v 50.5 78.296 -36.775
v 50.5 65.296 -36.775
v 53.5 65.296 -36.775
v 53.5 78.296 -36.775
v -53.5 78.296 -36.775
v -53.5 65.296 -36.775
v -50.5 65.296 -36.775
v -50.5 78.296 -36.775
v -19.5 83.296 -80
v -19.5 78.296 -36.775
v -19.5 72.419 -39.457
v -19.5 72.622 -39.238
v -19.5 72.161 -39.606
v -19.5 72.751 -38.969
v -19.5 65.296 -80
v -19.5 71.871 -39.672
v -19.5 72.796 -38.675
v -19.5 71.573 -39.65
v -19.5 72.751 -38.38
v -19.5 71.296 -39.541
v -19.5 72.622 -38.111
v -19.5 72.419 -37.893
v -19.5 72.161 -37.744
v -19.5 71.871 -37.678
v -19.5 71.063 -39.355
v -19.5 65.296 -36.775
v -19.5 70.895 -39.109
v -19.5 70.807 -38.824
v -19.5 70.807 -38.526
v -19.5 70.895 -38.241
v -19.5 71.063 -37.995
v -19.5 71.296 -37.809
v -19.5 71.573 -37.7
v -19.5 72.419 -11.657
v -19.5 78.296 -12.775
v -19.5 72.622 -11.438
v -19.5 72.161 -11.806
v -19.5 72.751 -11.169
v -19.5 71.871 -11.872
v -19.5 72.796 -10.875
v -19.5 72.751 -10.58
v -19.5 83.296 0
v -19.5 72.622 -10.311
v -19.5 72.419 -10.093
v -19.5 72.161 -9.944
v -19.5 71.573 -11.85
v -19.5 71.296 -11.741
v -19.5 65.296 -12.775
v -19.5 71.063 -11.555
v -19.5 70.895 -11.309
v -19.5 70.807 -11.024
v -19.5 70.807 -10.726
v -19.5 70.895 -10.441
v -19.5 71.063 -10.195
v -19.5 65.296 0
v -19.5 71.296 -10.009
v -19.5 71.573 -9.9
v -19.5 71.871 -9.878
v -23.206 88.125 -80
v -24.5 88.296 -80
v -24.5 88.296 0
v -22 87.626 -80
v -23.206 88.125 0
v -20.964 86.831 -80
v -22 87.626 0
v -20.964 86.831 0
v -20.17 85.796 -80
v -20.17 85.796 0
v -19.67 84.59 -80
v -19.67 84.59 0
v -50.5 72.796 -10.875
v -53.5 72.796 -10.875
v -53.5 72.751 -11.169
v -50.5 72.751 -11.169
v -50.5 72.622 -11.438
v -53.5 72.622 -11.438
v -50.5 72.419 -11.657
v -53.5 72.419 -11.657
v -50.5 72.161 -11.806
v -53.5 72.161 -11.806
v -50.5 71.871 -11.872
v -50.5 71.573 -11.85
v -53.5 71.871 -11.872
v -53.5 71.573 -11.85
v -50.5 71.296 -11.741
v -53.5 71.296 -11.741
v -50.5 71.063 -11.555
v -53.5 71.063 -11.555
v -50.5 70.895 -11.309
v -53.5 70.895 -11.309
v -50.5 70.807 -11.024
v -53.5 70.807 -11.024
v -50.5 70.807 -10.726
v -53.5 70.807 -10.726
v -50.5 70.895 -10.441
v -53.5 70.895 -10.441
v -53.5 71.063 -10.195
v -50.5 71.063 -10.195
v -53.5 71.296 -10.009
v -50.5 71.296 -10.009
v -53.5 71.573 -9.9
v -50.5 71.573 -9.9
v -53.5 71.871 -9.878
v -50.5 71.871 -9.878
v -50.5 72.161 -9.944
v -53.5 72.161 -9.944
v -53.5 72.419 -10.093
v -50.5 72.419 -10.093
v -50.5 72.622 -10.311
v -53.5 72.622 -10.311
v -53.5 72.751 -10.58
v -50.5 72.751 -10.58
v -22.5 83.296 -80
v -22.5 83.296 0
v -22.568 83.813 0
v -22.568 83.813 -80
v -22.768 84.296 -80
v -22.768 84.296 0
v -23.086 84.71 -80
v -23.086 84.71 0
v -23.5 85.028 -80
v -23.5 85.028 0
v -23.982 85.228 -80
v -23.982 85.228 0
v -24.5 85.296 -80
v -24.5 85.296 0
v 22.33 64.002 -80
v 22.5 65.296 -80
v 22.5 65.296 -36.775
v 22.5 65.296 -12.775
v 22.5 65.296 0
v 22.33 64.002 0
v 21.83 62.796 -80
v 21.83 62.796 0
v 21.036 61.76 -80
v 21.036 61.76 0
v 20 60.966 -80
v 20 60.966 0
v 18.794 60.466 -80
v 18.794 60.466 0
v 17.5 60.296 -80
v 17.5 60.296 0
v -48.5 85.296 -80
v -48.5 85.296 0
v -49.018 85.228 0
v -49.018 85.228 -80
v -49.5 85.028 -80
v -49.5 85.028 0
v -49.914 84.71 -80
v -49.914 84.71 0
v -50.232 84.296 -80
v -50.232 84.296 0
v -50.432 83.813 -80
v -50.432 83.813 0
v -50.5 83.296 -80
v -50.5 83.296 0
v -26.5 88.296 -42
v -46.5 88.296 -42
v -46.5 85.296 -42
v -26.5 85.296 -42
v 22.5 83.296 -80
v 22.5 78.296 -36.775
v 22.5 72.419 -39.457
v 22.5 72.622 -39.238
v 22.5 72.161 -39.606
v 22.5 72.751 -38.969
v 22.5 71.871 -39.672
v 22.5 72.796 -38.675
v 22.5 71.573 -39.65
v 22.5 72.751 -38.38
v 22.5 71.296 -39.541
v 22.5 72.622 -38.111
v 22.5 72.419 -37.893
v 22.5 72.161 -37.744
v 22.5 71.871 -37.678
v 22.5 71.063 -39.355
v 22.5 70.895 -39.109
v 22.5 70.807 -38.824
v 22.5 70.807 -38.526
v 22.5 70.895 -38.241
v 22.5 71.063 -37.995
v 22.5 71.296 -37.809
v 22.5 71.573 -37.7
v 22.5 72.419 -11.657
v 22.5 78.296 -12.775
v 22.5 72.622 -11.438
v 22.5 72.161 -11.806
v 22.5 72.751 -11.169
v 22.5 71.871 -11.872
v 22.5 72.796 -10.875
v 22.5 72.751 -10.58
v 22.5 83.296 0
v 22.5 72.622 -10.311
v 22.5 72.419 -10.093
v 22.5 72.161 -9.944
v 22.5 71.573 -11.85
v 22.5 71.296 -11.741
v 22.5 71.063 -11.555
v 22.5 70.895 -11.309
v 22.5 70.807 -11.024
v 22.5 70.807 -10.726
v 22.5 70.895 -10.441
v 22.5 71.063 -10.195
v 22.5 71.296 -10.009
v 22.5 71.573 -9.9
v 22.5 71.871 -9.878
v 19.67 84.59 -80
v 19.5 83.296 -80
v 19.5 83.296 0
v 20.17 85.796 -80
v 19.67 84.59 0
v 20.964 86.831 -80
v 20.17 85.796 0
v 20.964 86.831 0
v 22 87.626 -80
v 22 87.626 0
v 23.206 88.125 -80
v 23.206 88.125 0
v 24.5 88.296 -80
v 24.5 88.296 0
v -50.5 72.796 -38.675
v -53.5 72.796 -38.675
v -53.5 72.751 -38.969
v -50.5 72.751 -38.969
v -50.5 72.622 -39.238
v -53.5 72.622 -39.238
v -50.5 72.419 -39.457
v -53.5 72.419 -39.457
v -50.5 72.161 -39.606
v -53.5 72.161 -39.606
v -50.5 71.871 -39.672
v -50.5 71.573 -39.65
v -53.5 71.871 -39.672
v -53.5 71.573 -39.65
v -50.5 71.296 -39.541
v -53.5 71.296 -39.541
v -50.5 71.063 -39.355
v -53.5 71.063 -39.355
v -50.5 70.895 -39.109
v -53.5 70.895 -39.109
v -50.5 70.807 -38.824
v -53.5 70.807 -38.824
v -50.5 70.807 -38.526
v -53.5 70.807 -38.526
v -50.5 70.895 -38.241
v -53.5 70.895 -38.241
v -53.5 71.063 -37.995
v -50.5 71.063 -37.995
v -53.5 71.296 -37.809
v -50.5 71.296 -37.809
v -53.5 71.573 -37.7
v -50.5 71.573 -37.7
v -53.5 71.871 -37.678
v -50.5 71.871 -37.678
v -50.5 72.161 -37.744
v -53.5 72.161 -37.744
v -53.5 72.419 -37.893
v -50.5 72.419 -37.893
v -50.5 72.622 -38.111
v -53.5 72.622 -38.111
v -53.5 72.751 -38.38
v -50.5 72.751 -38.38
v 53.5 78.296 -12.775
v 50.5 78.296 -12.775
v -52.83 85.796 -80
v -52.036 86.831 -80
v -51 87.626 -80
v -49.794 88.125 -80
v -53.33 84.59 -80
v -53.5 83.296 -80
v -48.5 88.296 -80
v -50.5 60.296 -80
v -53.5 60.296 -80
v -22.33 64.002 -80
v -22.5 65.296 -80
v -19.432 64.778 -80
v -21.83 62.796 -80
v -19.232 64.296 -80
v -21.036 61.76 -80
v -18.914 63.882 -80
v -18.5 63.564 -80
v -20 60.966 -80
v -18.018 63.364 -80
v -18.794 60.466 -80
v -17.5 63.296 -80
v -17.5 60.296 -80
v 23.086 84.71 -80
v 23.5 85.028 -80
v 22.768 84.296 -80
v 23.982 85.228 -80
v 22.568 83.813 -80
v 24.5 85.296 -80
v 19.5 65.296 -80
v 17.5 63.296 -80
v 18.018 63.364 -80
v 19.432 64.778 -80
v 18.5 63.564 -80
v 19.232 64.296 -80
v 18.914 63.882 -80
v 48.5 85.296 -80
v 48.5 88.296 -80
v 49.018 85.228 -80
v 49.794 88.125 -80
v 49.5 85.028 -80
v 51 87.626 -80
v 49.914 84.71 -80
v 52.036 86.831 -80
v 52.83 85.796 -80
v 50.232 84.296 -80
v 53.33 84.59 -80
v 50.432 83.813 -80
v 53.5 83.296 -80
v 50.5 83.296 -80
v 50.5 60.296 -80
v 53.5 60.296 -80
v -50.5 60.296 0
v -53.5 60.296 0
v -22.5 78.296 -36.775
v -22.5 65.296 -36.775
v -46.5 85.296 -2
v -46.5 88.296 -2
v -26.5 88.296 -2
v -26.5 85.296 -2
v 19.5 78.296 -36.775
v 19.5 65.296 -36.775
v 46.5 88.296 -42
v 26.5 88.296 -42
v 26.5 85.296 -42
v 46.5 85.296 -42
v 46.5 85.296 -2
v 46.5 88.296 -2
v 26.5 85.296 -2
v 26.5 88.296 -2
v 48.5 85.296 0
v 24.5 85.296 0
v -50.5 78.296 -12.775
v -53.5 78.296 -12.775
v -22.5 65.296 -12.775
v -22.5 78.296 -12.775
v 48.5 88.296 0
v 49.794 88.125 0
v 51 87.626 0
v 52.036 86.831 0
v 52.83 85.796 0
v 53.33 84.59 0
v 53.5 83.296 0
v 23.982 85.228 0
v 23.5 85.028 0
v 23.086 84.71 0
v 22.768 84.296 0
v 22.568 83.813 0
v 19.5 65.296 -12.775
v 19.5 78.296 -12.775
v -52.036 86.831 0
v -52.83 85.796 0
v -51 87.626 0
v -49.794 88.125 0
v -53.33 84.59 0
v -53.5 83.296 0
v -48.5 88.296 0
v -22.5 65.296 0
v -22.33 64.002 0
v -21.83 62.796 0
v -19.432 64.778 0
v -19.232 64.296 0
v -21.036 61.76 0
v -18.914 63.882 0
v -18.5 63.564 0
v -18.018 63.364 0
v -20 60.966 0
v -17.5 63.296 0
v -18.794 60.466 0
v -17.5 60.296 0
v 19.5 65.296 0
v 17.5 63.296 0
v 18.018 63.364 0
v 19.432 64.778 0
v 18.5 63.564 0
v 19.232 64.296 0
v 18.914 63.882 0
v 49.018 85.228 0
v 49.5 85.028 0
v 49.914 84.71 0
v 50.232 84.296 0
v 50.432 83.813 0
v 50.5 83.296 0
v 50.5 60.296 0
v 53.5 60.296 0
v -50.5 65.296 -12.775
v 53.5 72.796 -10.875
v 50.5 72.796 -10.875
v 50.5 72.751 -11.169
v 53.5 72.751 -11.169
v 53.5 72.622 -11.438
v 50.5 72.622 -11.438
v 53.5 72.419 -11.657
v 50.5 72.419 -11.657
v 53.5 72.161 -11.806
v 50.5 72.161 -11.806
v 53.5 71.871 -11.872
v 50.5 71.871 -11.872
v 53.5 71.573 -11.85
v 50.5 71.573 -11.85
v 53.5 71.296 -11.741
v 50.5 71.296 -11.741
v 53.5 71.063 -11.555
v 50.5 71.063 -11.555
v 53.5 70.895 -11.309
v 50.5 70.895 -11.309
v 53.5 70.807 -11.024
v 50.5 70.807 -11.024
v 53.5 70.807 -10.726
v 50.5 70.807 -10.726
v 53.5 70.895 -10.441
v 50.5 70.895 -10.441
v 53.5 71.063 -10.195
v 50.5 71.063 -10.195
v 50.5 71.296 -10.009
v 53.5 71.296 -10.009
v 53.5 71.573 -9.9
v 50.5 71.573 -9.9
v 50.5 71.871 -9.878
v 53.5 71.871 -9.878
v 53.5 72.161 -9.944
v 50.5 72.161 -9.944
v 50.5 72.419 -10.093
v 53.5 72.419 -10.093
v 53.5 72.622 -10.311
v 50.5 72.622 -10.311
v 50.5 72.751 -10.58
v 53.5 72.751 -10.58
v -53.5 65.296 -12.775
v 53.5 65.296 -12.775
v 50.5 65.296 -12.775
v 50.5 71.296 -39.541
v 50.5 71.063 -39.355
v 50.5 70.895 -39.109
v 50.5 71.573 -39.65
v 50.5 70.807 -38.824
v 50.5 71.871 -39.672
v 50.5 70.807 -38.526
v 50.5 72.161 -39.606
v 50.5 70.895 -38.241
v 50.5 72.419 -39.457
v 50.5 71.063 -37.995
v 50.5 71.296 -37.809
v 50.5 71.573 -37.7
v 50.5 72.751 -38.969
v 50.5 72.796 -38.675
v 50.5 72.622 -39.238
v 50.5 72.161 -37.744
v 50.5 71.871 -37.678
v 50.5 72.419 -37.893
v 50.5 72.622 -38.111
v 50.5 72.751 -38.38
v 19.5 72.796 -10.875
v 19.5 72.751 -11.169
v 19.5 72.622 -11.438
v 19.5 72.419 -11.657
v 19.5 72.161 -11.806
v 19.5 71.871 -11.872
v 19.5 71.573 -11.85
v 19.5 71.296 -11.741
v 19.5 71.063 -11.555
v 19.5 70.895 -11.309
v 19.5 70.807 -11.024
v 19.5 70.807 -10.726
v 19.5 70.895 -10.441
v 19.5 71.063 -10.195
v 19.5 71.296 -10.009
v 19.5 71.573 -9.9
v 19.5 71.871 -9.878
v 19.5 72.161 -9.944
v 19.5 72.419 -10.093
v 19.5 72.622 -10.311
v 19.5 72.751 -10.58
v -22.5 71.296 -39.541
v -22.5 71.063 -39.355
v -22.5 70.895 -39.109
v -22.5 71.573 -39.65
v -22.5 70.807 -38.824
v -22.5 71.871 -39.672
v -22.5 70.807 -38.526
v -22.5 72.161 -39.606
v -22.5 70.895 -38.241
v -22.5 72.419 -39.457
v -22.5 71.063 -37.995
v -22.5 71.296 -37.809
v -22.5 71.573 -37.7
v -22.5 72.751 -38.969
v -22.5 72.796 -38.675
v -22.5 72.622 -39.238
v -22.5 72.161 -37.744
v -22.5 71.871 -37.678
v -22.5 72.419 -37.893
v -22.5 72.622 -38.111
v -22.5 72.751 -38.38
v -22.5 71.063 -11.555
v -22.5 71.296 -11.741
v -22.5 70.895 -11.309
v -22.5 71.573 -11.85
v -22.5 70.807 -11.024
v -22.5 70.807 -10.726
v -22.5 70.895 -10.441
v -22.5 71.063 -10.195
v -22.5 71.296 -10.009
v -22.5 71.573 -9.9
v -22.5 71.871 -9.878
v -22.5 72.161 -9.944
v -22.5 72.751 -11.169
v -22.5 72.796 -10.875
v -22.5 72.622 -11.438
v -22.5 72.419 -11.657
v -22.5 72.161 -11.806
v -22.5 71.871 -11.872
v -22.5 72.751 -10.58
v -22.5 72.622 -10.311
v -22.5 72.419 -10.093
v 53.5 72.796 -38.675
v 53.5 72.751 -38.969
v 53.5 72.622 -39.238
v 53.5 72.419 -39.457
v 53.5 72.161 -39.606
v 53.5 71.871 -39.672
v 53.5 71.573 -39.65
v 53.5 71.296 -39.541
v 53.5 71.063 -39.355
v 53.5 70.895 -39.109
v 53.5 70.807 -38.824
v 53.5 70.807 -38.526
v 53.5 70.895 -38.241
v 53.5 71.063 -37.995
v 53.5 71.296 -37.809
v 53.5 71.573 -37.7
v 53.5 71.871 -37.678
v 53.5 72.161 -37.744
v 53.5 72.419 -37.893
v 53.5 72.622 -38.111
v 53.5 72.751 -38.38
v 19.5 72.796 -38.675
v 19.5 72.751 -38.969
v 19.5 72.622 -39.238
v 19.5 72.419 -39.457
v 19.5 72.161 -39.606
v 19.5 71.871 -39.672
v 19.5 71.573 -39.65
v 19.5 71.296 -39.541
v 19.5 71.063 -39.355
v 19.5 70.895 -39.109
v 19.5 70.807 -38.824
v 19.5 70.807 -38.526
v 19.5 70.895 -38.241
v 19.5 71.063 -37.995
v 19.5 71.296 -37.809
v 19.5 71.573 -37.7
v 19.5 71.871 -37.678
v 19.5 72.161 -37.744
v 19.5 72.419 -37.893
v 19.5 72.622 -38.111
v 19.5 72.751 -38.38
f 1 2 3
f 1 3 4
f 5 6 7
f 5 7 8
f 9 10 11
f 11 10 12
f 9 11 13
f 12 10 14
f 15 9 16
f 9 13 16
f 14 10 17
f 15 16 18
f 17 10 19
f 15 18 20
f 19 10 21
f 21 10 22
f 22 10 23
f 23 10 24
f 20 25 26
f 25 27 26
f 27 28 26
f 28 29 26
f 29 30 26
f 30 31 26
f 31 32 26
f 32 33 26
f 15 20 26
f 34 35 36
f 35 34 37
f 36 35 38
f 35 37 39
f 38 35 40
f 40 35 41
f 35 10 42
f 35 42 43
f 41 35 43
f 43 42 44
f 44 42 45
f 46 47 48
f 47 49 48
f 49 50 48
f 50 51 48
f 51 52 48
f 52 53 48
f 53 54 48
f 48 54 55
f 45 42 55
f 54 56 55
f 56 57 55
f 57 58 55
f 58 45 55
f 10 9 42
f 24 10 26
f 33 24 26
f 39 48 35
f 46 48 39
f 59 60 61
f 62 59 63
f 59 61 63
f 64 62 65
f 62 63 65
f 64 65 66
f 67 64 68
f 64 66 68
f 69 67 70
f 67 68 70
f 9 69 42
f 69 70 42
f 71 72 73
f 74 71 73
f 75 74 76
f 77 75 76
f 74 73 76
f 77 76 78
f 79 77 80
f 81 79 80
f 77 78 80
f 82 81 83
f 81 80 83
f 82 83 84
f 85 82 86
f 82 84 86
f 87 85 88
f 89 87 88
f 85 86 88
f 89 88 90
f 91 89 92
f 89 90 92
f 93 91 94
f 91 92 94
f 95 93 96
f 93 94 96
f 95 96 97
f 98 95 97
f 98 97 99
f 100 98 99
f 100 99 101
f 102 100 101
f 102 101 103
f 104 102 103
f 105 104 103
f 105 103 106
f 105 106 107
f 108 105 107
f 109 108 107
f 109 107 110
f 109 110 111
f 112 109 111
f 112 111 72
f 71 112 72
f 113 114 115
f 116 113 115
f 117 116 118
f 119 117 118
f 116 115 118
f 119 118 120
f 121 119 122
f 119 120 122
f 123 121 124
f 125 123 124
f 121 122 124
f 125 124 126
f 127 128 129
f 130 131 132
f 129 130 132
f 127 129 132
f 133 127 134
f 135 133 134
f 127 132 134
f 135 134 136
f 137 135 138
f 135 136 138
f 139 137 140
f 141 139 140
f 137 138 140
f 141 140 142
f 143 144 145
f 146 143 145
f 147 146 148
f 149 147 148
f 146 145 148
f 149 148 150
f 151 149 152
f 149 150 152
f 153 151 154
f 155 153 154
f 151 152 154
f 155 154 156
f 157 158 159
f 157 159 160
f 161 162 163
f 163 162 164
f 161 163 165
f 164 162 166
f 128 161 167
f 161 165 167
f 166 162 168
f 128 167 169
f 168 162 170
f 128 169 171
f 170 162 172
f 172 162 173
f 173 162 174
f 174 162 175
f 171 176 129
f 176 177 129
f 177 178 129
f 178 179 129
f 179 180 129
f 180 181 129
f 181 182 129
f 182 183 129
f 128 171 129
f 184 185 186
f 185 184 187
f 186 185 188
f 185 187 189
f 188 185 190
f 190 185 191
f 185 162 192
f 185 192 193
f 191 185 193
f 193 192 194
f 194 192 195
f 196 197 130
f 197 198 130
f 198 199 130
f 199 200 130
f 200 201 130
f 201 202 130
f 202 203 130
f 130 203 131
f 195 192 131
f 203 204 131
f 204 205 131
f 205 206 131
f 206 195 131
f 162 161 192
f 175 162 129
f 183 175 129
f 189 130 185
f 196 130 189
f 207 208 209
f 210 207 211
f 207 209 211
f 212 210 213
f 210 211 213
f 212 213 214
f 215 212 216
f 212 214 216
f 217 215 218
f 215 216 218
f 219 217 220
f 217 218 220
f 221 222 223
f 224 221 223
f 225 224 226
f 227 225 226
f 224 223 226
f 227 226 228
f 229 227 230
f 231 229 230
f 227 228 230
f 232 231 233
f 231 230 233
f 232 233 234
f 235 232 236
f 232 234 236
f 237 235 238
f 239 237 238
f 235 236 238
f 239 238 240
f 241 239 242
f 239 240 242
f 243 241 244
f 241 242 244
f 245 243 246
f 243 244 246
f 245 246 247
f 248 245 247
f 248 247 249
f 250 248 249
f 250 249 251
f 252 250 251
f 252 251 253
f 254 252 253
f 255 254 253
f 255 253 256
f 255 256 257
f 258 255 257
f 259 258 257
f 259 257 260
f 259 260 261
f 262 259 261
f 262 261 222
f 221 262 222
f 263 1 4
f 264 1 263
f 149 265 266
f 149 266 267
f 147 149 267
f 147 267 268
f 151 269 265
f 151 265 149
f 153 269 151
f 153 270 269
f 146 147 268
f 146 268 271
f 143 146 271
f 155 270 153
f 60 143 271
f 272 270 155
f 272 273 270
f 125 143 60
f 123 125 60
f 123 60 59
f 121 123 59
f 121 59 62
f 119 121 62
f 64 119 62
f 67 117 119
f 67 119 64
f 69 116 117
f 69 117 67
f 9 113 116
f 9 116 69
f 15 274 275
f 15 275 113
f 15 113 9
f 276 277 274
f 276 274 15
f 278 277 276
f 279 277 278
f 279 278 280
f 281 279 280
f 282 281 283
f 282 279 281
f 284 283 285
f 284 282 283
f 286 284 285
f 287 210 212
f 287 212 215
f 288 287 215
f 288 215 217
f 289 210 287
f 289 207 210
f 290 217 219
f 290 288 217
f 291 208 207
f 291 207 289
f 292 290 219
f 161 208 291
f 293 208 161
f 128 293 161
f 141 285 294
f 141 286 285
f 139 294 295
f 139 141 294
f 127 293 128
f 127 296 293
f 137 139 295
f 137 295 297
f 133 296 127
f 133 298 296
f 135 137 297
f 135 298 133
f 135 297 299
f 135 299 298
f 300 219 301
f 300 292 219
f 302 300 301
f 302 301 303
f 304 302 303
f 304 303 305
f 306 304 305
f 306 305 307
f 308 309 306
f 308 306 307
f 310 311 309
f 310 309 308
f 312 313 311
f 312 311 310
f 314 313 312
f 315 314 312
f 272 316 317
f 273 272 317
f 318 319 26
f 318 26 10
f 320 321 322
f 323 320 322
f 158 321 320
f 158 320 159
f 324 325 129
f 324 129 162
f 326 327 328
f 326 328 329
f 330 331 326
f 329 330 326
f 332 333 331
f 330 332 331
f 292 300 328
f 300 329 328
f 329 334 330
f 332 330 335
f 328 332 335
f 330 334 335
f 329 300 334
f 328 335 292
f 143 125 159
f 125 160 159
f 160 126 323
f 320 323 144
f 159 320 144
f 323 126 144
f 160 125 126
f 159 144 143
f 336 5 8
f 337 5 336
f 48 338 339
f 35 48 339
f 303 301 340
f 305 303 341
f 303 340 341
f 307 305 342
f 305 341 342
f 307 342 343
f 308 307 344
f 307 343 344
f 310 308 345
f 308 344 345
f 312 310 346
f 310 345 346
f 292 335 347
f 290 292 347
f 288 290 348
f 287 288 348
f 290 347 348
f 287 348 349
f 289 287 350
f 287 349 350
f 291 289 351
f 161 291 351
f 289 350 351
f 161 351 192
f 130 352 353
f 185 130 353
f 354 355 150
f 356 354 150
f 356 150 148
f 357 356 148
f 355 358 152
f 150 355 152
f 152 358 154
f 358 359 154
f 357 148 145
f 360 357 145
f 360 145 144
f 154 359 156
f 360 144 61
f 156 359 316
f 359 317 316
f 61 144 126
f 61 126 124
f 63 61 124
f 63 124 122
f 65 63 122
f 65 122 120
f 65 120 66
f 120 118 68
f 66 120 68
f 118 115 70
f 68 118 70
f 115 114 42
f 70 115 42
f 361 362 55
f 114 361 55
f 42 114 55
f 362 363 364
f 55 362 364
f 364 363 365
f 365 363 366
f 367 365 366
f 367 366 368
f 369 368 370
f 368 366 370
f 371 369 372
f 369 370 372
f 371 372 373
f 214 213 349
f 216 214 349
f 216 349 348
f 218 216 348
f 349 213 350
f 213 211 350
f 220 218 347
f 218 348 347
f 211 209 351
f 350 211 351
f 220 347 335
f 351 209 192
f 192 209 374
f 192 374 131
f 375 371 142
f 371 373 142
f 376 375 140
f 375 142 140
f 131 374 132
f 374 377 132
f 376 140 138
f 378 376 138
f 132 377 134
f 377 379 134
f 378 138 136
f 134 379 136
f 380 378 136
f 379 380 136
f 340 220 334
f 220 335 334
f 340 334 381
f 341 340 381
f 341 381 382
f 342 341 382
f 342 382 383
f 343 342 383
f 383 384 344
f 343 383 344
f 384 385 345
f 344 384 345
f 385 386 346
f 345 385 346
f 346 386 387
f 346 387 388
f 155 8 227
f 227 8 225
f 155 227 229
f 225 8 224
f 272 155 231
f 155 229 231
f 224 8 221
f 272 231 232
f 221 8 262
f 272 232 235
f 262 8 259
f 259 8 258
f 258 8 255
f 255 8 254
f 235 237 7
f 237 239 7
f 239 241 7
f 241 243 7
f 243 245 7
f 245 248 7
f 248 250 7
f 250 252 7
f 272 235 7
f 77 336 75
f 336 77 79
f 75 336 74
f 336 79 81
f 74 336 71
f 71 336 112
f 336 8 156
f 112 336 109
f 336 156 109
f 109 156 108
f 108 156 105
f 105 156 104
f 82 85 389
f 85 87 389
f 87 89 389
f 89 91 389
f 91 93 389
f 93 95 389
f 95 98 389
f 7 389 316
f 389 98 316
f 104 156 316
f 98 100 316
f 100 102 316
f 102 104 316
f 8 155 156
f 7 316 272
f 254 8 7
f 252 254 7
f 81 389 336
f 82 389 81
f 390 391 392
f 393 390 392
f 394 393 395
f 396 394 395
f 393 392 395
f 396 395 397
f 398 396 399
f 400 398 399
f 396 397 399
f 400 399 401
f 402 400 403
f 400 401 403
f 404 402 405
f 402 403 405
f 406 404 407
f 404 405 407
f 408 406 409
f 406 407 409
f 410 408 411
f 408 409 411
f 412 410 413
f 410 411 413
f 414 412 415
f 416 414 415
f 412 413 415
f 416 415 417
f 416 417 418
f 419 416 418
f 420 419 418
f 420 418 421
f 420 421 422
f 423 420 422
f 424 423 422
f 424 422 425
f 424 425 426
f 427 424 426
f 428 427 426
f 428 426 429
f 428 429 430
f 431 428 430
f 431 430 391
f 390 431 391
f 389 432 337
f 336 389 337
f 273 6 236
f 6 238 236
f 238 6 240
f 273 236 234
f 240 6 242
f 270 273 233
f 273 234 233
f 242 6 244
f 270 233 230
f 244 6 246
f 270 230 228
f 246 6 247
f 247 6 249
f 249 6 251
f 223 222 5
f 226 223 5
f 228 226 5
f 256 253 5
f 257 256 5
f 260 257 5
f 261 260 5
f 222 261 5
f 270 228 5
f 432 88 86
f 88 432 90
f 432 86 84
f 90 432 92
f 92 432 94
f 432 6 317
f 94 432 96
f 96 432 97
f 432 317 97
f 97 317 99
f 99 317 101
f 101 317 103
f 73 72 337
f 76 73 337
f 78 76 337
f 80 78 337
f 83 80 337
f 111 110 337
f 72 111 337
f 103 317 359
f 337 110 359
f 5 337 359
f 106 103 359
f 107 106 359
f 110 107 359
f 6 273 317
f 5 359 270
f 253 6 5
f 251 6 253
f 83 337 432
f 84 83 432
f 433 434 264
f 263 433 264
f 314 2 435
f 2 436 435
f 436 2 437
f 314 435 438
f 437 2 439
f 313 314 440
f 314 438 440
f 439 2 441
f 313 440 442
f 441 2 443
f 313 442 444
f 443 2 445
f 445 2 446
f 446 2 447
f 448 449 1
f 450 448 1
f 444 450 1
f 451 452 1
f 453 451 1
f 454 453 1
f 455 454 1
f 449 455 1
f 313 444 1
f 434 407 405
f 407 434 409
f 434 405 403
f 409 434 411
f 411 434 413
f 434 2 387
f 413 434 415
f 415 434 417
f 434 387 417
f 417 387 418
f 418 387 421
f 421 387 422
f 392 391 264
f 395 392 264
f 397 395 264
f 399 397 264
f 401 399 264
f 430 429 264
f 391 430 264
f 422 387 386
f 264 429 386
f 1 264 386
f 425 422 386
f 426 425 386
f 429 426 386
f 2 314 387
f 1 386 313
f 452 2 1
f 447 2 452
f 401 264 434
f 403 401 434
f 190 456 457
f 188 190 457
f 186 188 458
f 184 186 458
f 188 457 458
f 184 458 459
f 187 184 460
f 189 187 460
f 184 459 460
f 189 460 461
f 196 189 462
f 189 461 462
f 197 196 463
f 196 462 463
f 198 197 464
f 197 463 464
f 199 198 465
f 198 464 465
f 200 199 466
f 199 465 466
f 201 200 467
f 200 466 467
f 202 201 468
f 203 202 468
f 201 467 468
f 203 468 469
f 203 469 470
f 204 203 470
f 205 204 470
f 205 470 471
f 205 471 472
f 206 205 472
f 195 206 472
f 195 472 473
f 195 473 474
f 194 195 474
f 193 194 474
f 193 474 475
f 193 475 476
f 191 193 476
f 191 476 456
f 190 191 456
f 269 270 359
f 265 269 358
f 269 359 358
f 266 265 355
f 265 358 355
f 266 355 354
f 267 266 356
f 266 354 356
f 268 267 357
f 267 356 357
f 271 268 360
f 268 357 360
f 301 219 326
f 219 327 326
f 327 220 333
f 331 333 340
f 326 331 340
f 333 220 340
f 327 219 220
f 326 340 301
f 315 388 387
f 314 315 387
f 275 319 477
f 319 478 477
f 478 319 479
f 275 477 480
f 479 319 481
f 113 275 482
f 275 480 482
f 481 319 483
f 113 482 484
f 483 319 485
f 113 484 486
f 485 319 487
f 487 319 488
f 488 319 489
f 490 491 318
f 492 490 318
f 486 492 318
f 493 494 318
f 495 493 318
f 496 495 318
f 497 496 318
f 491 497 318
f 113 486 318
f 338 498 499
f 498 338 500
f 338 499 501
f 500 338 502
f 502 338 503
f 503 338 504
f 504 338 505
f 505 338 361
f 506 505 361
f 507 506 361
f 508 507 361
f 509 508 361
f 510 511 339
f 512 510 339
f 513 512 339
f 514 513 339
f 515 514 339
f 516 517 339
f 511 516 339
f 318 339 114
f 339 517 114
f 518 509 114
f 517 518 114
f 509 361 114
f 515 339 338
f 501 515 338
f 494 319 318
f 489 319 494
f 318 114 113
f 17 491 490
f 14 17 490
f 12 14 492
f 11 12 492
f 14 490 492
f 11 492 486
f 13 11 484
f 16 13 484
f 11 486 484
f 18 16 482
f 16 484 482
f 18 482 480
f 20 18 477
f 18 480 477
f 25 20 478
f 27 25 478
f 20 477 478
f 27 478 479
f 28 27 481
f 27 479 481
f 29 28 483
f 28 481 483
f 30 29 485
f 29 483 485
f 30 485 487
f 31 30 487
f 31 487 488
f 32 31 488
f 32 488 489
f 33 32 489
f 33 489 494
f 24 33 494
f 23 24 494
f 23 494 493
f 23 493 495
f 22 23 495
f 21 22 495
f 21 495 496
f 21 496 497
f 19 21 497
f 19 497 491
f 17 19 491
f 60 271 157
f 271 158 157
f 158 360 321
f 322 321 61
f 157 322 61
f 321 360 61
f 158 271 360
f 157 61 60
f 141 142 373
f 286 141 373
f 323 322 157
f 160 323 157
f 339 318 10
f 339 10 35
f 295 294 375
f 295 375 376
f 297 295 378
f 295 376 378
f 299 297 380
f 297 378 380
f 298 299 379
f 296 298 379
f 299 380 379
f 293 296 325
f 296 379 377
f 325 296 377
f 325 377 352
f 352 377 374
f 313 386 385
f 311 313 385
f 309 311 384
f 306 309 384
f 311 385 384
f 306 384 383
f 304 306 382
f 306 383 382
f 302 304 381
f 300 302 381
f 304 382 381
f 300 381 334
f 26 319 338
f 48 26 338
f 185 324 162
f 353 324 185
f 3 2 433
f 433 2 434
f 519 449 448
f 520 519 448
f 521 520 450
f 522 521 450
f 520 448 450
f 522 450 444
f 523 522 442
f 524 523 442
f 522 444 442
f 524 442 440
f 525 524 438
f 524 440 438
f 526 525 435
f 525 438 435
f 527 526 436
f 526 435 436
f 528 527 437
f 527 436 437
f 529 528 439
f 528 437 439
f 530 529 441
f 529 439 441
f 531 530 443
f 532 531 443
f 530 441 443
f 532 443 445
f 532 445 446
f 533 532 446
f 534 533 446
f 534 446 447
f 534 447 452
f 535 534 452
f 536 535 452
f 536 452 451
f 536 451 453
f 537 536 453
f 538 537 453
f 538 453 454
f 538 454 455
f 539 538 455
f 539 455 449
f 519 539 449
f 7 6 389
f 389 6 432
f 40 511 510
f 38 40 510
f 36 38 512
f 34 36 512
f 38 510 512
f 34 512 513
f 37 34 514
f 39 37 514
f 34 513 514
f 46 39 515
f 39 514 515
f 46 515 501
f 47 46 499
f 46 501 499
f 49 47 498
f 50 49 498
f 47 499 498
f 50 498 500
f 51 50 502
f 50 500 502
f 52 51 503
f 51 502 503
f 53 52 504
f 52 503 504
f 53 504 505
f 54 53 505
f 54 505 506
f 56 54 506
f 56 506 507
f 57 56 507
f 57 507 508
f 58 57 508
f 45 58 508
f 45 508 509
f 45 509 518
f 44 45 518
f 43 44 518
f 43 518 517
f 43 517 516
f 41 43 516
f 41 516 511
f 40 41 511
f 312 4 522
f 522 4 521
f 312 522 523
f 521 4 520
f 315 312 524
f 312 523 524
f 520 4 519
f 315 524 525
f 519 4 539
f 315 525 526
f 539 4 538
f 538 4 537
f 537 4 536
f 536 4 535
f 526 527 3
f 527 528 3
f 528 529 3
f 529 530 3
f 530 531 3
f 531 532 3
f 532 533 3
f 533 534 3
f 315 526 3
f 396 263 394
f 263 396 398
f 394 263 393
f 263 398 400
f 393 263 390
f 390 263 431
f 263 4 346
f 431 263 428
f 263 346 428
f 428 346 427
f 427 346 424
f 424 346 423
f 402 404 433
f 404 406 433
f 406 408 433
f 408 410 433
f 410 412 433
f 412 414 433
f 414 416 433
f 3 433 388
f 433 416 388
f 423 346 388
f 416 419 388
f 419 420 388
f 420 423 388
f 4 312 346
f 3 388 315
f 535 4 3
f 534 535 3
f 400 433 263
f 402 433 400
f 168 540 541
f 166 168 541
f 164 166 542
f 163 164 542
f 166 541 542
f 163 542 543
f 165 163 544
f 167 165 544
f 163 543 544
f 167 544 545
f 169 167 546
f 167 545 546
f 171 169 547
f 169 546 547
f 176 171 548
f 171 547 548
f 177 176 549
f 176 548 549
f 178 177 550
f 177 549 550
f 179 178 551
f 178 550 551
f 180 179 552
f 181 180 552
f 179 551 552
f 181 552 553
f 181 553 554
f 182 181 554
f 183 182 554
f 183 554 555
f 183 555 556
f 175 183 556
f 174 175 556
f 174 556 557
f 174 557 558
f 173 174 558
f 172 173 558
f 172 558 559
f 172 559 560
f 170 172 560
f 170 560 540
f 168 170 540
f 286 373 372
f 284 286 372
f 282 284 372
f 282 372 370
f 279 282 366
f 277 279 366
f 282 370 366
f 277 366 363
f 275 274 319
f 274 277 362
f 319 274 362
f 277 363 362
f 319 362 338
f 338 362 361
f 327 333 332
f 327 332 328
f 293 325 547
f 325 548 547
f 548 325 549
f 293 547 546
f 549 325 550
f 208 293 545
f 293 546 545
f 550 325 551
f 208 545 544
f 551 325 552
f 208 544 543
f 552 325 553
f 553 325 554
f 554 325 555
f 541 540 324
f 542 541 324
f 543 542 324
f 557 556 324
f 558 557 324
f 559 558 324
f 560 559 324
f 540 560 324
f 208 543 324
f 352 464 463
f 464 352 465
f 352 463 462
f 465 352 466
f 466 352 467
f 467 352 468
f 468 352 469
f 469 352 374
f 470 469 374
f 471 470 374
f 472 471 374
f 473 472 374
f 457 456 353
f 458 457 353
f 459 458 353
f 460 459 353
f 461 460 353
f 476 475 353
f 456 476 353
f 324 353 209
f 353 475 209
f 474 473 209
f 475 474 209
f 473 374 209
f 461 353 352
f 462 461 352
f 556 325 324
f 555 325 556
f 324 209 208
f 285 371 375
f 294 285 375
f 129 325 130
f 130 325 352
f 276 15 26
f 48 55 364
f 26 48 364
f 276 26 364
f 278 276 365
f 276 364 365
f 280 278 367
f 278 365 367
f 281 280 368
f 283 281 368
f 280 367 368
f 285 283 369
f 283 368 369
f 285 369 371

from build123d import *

# Parameters (mm, degrees)
BASE_FLANGE1_DEPTH = 80
SKETCH6_R          = 1
SKETCH6_W          = 24
SKETCH6_H          = 13
CUT_EXTRUDE1_DEPTH = 161.141019336
SKETCH7_W          = 20
SKETCH7_H          = 40
CUT_EXTRUDE2_DEPTH = 10


# Sheet-metal steps are written as plain solids
with BuildPart() as part:
    # Sketch1 → Base-Flange1 (new body)
    with BuildSketch(Plane(origin=(0, 0, 0), x_dir=(1, 0, 0), z_dir=(0, 0, -1))):
        with BuildLine():
            Line((50.5, -60.295787408), (50.5, -83.295787408))
            ThreePointArc((50.5, -83.295787408), (49.914213562, -84.710000971), (48.5, -85.295787408))
            Line((48.5, -85.295787408), (24.5, -85.295787408))
            ThreePointArc((24.5, -85.295787408), (23.085786438, -84.710000971), (22.5, -83.295787408))
            Line((22.5, -83.295787408), (22.5, -65.295787408))
            ThreePointArc((22.5, -65.295787408), (21.035533906, -61.760253502), (17.5, -60.295787408))
            Line((17.5, -60.295787408), (-17.5, -60.295787408))
            ThreePointArc((-17.5, -60.295787408), (-21.035533906, -61.760253502), (-22.5, -65.295787408))
            Line((-22.5, -65.295787408), (-22.5, -83.295787408))
            ThreePointArc((-22.5, -83.295787408), (-23.085786438, -84.710000971), (-24.5, -85.295787408))
            Line((-24.5, -85.295787408), (-48.5, -85.295787408))
            ThreePointArc((-48.5, -85.295787408), (-49.914213562, -84.710000971), (-50.5, -83.295787408))
            Line((-50.5, -83.295787408), (-50.5, -60.295787408))
            Line((-50.5, -60.295787408), (-53.5, -60.295787408))
            Line((-53.5, -60.295787408), (-53.5, -83.295787408))
            ThreePointArc((-53.5, -83.295787408), (-52.035533906, -86.831321314), (-48.5, -88.295787408))
            Line((-48.5, -88.295787408), (-24.5, -88.295787408))
            ThreePointArc((-24.5, -88.295787408), (-20.964466094, -86.831321314), (-19.5, -83.295787408))
            Line((-19.5, -83.295787408), (-19.5, -65.295787408))
            ThreePointArc((-19.5, -65.295787408), (-18.914213562, -63.881573846), (-17.5, -63.295787408))
            Line((-17.5, -63.295787408), (17.5, -63.295787408))
            ThreePointArc((17.5, -63.295787408), (18.914213562, -63.881573846), (19.5, -65.295787408))
            Line((19.5, -65.295787408), (19.5, -83.295787408))
            ThreePointArc((19.5, -83.295787408), (20.964466094, -86.831321314), (24.5, -88.295787408))
            Line((24.5, -88.295787408), (48.5, -88.295787408))
            ThreePointArc((48.5, -88.295787408), (52.035533906, -86.831321314), (53.5, -83.295787408))
            Line((53.5, -83.295787408), (53.5, -60.295787408))
            Line((53.5, -60.295787408), (50.5, -60.295787408))
        make_face()
    extrude(amount=BASE_FLANGE1_DEPTH)

    # Sketch6 → Cut-Extrude1 (cut, through all)
    with BuildSketch(Plane.ZY.offset(53.5)):
        with Locations(Location((-38.674720748, 71.795787408, 0), (0, 0, 90))):
            Circle(SKETCH6_R)
        with Locations(Location((-10.874720748, 71.795787408, 0), (0, 0, 90))):
            Circle(SKETCH6_R)
        with Locations((-24.774720748, 71.795787408)):
            Rectangle(SKETCH6_W, SKETCH6_H)
    extrude(amount=-CUT_EXTRUDE1_DEPTH, mode=Mode.SUBTRACT)

    # Sketch7 → Cut-Extrude2 (cut)
    with BuildSketch(Plane(origin=(0, 88.295787408, 0), x_dir=(1, 0, 0), z_dir=(0, 1, 0))):
        with Locations((-36.5, 22)):
            Rectangle(SKETCH7_W, SKETCH7_H)
        with Locations((36.5, 22)):
            Rectangle(SKETCH7_W, SKETCH7_H)
    extrude(amount=-CUT_EXTRUDE2_DEPTH, mode=Mode.SUBTRACT)


solid = part.part
